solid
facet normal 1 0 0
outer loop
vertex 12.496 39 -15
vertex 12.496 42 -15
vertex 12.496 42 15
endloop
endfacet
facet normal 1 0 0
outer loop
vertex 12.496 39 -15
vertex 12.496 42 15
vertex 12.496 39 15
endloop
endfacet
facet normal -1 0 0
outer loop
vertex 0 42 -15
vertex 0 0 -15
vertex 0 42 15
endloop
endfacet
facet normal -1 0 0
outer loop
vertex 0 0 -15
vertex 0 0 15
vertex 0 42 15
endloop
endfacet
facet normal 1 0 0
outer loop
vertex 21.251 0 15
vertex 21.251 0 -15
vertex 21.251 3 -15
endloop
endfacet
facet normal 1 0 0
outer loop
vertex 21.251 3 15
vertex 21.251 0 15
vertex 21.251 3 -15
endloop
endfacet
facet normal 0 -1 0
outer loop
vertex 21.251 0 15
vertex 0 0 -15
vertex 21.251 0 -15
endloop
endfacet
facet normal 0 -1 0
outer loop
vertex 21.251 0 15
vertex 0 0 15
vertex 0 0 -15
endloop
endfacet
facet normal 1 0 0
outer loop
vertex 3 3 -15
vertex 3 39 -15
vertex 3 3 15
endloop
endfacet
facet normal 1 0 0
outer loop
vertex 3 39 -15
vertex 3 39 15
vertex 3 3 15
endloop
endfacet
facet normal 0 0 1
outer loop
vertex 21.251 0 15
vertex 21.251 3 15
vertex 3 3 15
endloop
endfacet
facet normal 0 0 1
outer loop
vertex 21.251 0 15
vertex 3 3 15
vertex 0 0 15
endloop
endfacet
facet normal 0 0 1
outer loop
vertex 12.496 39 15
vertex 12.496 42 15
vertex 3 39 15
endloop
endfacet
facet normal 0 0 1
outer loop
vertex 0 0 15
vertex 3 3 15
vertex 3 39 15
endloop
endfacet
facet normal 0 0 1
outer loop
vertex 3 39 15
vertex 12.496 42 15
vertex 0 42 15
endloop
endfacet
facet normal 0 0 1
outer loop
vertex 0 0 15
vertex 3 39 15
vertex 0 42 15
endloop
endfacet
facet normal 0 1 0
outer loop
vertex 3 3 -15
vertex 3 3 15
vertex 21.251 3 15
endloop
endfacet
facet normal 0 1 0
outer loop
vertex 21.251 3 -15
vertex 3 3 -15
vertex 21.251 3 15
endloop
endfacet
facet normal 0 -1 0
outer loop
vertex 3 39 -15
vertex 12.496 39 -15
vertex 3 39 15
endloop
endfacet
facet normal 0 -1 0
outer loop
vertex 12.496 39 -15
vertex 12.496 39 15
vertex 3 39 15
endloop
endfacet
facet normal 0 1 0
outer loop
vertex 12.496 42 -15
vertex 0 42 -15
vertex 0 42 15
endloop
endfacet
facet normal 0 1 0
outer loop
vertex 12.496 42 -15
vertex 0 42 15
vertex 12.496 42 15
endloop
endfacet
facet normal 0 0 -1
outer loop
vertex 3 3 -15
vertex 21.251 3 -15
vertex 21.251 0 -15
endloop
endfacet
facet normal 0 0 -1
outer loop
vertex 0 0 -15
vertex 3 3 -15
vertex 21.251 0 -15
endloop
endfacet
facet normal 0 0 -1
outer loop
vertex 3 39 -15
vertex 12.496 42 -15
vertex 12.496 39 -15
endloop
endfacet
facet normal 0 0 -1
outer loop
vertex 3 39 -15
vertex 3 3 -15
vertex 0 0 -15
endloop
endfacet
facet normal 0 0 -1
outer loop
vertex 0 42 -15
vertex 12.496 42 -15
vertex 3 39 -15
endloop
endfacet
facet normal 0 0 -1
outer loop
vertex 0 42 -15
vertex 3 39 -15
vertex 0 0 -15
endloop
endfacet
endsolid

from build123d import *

# Parameters (mm, degrees)
SKETCH1_W           = 18.250795329
SKETCH1_H           = 3
BOSS_EXTRUDE1_DEPTH = 15


with BuildPart() as part:
    # Sketch1 → Boss-Extrude1 (new, symmetric)
    with BuildSketch(Plane.XY):
        Polygon((3, 0), (0, 0), (0, 42), (12.496402878, 42), (12.496402878, 39), (3, 39), align=None)
        with Locations((12.125397665, 1.5)):
            Rectangle(SKETCH1_W, SKETCH1_H)
    extrude(amount=BOSS_EXTRUDE1_DEPTH, both=True)


solid = part.part
